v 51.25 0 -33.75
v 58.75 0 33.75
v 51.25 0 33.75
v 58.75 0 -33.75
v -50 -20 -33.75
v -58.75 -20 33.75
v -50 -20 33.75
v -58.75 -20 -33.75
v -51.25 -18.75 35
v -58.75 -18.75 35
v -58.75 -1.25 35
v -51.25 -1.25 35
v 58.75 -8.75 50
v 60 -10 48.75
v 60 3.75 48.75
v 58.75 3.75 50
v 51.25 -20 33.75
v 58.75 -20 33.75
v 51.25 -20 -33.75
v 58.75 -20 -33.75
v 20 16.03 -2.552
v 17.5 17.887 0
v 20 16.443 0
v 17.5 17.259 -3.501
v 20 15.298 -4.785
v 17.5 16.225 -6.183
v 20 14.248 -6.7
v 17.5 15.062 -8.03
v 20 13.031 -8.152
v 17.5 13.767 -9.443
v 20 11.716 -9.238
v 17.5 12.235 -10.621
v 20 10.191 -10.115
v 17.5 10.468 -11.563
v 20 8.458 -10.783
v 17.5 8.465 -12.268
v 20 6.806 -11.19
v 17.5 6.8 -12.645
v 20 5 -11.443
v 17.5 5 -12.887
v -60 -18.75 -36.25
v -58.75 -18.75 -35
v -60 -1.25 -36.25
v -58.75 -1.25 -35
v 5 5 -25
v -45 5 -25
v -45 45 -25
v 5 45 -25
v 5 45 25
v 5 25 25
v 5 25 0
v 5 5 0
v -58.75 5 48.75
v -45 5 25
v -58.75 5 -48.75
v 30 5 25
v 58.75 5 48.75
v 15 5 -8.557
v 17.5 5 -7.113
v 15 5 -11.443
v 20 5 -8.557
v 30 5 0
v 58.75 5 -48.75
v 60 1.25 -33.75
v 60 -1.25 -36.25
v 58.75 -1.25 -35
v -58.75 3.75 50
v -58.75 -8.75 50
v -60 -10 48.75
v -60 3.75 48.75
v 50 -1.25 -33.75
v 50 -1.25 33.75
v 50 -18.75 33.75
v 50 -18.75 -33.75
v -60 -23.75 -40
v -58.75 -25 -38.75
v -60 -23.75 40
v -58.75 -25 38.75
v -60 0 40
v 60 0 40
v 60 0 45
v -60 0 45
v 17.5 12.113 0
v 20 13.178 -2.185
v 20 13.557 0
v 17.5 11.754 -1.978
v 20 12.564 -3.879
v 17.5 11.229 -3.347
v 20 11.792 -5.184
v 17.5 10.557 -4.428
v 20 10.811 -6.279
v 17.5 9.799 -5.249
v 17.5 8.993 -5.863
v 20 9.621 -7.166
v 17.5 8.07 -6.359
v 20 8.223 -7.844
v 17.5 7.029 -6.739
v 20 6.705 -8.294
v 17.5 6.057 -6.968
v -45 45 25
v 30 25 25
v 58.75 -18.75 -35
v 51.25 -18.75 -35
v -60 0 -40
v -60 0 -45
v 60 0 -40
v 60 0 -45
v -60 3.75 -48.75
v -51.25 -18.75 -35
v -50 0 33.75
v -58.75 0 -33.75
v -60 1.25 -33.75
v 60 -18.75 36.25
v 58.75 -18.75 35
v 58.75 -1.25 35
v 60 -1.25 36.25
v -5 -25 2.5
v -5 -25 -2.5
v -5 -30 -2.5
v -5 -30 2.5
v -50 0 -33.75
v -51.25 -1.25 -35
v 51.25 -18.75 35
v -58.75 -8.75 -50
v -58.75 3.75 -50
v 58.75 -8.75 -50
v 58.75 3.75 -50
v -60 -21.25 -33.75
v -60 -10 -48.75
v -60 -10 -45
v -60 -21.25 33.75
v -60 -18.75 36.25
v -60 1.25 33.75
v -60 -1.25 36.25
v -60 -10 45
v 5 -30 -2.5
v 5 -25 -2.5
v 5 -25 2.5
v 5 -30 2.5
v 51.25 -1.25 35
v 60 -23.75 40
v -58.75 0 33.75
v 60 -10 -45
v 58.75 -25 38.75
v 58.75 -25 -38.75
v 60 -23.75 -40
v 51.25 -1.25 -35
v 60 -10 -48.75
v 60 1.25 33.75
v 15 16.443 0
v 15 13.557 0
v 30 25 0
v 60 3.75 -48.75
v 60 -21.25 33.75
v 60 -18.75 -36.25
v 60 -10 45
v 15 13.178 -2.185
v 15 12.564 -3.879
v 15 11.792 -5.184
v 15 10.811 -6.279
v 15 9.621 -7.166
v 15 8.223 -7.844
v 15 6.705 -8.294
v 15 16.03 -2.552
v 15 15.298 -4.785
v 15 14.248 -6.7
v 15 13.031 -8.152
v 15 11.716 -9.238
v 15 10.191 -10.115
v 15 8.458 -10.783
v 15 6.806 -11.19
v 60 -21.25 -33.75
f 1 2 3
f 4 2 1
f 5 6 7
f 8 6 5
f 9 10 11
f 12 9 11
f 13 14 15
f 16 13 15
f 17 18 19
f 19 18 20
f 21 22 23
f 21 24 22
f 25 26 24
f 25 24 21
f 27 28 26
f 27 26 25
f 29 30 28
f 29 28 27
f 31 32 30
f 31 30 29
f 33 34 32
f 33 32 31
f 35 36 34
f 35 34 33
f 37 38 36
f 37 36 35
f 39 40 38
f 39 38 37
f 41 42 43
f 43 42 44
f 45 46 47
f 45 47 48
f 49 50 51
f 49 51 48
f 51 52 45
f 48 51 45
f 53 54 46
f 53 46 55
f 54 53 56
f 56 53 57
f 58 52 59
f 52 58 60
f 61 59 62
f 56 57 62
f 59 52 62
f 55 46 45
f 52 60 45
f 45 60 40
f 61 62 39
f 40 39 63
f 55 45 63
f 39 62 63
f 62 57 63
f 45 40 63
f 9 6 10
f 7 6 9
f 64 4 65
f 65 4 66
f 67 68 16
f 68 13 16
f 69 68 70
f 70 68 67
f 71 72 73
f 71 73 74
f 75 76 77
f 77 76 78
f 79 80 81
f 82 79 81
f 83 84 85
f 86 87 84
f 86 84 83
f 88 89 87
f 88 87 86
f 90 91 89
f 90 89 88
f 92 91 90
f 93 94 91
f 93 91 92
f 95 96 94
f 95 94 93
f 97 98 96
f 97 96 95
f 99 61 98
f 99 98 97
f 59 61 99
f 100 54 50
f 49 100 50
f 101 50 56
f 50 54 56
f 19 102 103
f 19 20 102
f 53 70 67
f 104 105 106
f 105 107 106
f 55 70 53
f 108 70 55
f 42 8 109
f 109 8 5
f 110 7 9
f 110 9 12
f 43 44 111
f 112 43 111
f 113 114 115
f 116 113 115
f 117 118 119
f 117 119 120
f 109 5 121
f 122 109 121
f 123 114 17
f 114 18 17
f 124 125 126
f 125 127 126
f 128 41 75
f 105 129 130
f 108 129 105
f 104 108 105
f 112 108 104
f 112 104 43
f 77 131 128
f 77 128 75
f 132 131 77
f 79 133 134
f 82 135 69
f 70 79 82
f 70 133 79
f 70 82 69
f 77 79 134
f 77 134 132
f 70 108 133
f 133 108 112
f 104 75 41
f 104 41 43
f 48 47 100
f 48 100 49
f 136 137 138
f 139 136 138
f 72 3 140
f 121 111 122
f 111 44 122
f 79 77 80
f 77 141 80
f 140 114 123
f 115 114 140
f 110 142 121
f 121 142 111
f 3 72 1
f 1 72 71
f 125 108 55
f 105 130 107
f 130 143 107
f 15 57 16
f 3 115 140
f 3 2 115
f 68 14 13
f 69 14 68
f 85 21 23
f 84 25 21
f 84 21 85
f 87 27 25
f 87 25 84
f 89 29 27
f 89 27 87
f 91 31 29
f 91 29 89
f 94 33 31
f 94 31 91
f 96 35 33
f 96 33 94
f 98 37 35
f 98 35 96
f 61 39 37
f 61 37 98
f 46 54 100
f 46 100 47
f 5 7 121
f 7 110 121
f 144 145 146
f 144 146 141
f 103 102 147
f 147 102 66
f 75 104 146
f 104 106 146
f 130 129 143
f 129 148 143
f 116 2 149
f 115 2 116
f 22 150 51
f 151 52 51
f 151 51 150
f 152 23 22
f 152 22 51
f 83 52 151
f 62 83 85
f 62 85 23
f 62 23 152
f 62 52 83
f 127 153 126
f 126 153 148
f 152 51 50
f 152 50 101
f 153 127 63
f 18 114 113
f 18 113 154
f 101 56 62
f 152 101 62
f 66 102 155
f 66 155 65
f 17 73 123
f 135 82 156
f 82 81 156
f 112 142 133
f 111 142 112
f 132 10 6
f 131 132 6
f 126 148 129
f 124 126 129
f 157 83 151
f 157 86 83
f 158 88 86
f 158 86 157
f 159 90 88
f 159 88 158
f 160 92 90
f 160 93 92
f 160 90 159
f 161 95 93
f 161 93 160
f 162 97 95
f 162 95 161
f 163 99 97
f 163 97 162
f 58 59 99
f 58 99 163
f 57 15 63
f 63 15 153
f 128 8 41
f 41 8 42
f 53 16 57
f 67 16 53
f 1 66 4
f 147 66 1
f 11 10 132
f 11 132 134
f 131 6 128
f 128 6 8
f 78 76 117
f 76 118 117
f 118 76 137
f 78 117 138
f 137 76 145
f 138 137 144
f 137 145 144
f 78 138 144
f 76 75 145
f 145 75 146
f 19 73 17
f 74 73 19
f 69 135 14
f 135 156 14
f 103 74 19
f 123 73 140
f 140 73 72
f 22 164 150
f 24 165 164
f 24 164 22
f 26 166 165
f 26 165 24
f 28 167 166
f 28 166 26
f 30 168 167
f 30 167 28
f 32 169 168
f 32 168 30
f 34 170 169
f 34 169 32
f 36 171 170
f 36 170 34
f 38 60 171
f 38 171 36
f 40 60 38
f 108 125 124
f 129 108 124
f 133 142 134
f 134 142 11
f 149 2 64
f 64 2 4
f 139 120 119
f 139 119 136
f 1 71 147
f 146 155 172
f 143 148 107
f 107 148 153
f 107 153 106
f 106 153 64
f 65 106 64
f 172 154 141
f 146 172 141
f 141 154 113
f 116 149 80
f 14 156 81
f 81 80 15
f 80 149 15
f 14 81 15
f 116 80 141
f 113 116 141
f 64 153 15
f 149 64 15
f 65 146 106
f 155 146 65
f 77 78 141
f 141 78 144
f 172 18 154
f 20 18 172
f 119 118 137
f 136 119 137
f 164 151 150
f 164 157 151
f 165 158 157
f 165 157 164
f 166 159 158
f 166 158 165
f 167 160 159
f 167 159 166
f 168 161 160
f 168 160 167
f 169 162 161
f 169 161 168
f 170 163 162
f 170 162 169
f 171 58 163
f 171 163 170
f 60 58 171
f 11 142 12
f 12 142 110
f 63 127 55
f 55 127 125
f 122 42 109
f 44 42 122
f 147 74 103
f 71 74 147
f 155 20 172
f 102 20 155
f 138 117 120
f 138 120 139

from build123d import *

# Parameters (mm, degrees)
BOSS_EXTRUDE1_DEPTH = 60
SKETCH2_W           = 50
SKETCH2_H           = 50
BOSS_EXTRUDE2_DEPTH = 40
SKETCH2_3_W         = 25
SKETCH2_3_H         = 25
BOSS_EXTRUDE3_DEPTH = 20
SKETCH7_W           = 70
SKETCH7_H           = 20
CUT_EXTRUDE1_DEPTH  = 10
SKETCH8_W           = 10
SKETCH8_H           = 5
BOSS_EXTRUDE4_DEPTH = 5
CHAMFER1_SIZE       = 1.25


with BuildPart() as part:
    # Sketch1 → Boss-Extrude1 (new body, symmetric)
    with BuildSketch(Plane(origin=(0, 0, 0), x_dir=(0, 0, -1), z_dir=(1, 0, 0))):
        Polygon((-40, 0), (-45, 0), (-45, -10), (-50, -10), (-50, 5), (50, 5), (50, -10), (45, -10), (45, 0), (40, 0), (40, -25), (-40, -25), align=None)
    extrude(amount=BOSS_EXTRUDE1_DEPTH, both=True)

    # Sketch2 → Boss-Extrude2 (add)
    with BuildSketch(Plane(origin=(0, 5, 0), x_dir=(1, 0, 0), z_dir=(0, 1, 0))):
        with Locations((-20, 0)):
            Rectangle(SKETCH2_W, SKETCH2_H)
    extrude(amount=BOSS_EXTRUDE2_DEPTH)

    # Sketch2<3> → Boss-Extrude3 (add)
    with BuildSketch(Plane(origin=(0, 5, 0), x_dir=(1, 0, 0), z_dir=(0, 1, 0))):
        with Locations((17.5, -12.5)):
            Rectangle(SKETCH2_3_W, SKETCH2_3_H)
    extrude(amount=BOSS_EXTRUDE3_DEPTH)

    # Sketch3 → Loft3 section 0
    with BuildSketch(Plane(origin=(0, 0, 0), x_dir=(-1, 0, 0), z_dir=(0, 0, -1))):
        Polygon((-17.5, 17.886751346), (-20, 16.443375673), (-20, 13.556624327), (-17.5, 12.113248654), (-15, 13.556624327), (-15, 16.443375673), align=None)
    # Sketch6 → Loft3 section 1
    with BuildSketch(Plane(origin=(0, 2.5, 2.5), x_dir=(1, 0, 0), z_dir=(0, 0.707106781, 0.707106781))):
        Polygon((17.5, 16.422285252), (15, 14.978909579), (15, 12.092158233), (17.5, 10.64878256), (20, 12.092158233), (20, 14.978909579), align=None)
    # Sketch4 → Loft3 section 2
    with BuildSketch(Plane(origin=(0, 5, 0), x_dir=(1, 0, 0), z_dir=(0, 1, 0))):
        Polygon((17.5, 12.886751346), (15, 11.443375673), (15, 8.556624327), (17.5, 7.113248654), (20, 8.556624327), (20, 11.443375673), align=None)
    loft()

    # Sketch7 → Cut-Extrude1 (cut)
    with BuildSketch(Plane(origin=(60, 0, 0), x_dir=(0, 0, -1), z_dir=(1, 0, 0))):
        with Locations((0, -10)):
            Rectangle(SKETCH7_W, SKETCH7_H)
    cut_extrude1 = extrude(amount=-CUT_EXTRUDE1_DEPTH, mode=Mode.SUBTRACT)

    # Mirror1: Cut-Extrude1 across plane
    add(cut_extrude1.mirror(Plane(origin=(0, 0, 0), x_dir=(0, 0, 1), z_dir=(1, 0, 0))), mode=Mode.SUBTRACT)

    # Sketch8 → Boss-Extrude4 (add)
    with BuildSketch(Plane.XZ.offset(25)):
        Rectangle(SKETCH8_W, SKETCH8_H)
    extrude(amount=BOSS_EXTRUDE4_DEPTH)

    # Chamfer1
    chamfer1_edges = [part.edges().sort_by_distance(p)[0] for p in [
        (50, 0, 0),
        (55, 0, 35),
        (50, -10, -35),
        (55, 0, -35),
        (50, -20, 0),
        (55, -20, -35),
        (50, -10, 35),
        (55, -20, 35),
        (60, 0, 0),
        (60, -10, 35),
        (60, -20, 0),
        (60, -10, -35),
        (-60, 0, 0),
        (-55, 0, -35),
        (-60, -2.5, 50),
        (-60, -10, 35),
        (-55, 0, 35),
        (-60, -20, 0),
        (-55, -20, 35),
        (-60, -10, -35),
        (-55, -20, -35),
        (-50, -10, 35),
        (-50, -10, -35),
        (-60, 5, 0),
        (-60, -2.5, -50),
        (-60, -25, 0),
        (0, -10, 50),
        (0, 5, 50),
        (0, 5, -50),
        (0, -10, -50),
        (0, -25, -40),
        (0, -25, 40),
        (60, -2.5, -50),
        (60, 5, 0),
        (60, -2.5, 50),
        (60, -25, 0),
    ]]
    chamfer(chamfer1_edges, length=CHAMFER1_SIZE)


solid = part.part
